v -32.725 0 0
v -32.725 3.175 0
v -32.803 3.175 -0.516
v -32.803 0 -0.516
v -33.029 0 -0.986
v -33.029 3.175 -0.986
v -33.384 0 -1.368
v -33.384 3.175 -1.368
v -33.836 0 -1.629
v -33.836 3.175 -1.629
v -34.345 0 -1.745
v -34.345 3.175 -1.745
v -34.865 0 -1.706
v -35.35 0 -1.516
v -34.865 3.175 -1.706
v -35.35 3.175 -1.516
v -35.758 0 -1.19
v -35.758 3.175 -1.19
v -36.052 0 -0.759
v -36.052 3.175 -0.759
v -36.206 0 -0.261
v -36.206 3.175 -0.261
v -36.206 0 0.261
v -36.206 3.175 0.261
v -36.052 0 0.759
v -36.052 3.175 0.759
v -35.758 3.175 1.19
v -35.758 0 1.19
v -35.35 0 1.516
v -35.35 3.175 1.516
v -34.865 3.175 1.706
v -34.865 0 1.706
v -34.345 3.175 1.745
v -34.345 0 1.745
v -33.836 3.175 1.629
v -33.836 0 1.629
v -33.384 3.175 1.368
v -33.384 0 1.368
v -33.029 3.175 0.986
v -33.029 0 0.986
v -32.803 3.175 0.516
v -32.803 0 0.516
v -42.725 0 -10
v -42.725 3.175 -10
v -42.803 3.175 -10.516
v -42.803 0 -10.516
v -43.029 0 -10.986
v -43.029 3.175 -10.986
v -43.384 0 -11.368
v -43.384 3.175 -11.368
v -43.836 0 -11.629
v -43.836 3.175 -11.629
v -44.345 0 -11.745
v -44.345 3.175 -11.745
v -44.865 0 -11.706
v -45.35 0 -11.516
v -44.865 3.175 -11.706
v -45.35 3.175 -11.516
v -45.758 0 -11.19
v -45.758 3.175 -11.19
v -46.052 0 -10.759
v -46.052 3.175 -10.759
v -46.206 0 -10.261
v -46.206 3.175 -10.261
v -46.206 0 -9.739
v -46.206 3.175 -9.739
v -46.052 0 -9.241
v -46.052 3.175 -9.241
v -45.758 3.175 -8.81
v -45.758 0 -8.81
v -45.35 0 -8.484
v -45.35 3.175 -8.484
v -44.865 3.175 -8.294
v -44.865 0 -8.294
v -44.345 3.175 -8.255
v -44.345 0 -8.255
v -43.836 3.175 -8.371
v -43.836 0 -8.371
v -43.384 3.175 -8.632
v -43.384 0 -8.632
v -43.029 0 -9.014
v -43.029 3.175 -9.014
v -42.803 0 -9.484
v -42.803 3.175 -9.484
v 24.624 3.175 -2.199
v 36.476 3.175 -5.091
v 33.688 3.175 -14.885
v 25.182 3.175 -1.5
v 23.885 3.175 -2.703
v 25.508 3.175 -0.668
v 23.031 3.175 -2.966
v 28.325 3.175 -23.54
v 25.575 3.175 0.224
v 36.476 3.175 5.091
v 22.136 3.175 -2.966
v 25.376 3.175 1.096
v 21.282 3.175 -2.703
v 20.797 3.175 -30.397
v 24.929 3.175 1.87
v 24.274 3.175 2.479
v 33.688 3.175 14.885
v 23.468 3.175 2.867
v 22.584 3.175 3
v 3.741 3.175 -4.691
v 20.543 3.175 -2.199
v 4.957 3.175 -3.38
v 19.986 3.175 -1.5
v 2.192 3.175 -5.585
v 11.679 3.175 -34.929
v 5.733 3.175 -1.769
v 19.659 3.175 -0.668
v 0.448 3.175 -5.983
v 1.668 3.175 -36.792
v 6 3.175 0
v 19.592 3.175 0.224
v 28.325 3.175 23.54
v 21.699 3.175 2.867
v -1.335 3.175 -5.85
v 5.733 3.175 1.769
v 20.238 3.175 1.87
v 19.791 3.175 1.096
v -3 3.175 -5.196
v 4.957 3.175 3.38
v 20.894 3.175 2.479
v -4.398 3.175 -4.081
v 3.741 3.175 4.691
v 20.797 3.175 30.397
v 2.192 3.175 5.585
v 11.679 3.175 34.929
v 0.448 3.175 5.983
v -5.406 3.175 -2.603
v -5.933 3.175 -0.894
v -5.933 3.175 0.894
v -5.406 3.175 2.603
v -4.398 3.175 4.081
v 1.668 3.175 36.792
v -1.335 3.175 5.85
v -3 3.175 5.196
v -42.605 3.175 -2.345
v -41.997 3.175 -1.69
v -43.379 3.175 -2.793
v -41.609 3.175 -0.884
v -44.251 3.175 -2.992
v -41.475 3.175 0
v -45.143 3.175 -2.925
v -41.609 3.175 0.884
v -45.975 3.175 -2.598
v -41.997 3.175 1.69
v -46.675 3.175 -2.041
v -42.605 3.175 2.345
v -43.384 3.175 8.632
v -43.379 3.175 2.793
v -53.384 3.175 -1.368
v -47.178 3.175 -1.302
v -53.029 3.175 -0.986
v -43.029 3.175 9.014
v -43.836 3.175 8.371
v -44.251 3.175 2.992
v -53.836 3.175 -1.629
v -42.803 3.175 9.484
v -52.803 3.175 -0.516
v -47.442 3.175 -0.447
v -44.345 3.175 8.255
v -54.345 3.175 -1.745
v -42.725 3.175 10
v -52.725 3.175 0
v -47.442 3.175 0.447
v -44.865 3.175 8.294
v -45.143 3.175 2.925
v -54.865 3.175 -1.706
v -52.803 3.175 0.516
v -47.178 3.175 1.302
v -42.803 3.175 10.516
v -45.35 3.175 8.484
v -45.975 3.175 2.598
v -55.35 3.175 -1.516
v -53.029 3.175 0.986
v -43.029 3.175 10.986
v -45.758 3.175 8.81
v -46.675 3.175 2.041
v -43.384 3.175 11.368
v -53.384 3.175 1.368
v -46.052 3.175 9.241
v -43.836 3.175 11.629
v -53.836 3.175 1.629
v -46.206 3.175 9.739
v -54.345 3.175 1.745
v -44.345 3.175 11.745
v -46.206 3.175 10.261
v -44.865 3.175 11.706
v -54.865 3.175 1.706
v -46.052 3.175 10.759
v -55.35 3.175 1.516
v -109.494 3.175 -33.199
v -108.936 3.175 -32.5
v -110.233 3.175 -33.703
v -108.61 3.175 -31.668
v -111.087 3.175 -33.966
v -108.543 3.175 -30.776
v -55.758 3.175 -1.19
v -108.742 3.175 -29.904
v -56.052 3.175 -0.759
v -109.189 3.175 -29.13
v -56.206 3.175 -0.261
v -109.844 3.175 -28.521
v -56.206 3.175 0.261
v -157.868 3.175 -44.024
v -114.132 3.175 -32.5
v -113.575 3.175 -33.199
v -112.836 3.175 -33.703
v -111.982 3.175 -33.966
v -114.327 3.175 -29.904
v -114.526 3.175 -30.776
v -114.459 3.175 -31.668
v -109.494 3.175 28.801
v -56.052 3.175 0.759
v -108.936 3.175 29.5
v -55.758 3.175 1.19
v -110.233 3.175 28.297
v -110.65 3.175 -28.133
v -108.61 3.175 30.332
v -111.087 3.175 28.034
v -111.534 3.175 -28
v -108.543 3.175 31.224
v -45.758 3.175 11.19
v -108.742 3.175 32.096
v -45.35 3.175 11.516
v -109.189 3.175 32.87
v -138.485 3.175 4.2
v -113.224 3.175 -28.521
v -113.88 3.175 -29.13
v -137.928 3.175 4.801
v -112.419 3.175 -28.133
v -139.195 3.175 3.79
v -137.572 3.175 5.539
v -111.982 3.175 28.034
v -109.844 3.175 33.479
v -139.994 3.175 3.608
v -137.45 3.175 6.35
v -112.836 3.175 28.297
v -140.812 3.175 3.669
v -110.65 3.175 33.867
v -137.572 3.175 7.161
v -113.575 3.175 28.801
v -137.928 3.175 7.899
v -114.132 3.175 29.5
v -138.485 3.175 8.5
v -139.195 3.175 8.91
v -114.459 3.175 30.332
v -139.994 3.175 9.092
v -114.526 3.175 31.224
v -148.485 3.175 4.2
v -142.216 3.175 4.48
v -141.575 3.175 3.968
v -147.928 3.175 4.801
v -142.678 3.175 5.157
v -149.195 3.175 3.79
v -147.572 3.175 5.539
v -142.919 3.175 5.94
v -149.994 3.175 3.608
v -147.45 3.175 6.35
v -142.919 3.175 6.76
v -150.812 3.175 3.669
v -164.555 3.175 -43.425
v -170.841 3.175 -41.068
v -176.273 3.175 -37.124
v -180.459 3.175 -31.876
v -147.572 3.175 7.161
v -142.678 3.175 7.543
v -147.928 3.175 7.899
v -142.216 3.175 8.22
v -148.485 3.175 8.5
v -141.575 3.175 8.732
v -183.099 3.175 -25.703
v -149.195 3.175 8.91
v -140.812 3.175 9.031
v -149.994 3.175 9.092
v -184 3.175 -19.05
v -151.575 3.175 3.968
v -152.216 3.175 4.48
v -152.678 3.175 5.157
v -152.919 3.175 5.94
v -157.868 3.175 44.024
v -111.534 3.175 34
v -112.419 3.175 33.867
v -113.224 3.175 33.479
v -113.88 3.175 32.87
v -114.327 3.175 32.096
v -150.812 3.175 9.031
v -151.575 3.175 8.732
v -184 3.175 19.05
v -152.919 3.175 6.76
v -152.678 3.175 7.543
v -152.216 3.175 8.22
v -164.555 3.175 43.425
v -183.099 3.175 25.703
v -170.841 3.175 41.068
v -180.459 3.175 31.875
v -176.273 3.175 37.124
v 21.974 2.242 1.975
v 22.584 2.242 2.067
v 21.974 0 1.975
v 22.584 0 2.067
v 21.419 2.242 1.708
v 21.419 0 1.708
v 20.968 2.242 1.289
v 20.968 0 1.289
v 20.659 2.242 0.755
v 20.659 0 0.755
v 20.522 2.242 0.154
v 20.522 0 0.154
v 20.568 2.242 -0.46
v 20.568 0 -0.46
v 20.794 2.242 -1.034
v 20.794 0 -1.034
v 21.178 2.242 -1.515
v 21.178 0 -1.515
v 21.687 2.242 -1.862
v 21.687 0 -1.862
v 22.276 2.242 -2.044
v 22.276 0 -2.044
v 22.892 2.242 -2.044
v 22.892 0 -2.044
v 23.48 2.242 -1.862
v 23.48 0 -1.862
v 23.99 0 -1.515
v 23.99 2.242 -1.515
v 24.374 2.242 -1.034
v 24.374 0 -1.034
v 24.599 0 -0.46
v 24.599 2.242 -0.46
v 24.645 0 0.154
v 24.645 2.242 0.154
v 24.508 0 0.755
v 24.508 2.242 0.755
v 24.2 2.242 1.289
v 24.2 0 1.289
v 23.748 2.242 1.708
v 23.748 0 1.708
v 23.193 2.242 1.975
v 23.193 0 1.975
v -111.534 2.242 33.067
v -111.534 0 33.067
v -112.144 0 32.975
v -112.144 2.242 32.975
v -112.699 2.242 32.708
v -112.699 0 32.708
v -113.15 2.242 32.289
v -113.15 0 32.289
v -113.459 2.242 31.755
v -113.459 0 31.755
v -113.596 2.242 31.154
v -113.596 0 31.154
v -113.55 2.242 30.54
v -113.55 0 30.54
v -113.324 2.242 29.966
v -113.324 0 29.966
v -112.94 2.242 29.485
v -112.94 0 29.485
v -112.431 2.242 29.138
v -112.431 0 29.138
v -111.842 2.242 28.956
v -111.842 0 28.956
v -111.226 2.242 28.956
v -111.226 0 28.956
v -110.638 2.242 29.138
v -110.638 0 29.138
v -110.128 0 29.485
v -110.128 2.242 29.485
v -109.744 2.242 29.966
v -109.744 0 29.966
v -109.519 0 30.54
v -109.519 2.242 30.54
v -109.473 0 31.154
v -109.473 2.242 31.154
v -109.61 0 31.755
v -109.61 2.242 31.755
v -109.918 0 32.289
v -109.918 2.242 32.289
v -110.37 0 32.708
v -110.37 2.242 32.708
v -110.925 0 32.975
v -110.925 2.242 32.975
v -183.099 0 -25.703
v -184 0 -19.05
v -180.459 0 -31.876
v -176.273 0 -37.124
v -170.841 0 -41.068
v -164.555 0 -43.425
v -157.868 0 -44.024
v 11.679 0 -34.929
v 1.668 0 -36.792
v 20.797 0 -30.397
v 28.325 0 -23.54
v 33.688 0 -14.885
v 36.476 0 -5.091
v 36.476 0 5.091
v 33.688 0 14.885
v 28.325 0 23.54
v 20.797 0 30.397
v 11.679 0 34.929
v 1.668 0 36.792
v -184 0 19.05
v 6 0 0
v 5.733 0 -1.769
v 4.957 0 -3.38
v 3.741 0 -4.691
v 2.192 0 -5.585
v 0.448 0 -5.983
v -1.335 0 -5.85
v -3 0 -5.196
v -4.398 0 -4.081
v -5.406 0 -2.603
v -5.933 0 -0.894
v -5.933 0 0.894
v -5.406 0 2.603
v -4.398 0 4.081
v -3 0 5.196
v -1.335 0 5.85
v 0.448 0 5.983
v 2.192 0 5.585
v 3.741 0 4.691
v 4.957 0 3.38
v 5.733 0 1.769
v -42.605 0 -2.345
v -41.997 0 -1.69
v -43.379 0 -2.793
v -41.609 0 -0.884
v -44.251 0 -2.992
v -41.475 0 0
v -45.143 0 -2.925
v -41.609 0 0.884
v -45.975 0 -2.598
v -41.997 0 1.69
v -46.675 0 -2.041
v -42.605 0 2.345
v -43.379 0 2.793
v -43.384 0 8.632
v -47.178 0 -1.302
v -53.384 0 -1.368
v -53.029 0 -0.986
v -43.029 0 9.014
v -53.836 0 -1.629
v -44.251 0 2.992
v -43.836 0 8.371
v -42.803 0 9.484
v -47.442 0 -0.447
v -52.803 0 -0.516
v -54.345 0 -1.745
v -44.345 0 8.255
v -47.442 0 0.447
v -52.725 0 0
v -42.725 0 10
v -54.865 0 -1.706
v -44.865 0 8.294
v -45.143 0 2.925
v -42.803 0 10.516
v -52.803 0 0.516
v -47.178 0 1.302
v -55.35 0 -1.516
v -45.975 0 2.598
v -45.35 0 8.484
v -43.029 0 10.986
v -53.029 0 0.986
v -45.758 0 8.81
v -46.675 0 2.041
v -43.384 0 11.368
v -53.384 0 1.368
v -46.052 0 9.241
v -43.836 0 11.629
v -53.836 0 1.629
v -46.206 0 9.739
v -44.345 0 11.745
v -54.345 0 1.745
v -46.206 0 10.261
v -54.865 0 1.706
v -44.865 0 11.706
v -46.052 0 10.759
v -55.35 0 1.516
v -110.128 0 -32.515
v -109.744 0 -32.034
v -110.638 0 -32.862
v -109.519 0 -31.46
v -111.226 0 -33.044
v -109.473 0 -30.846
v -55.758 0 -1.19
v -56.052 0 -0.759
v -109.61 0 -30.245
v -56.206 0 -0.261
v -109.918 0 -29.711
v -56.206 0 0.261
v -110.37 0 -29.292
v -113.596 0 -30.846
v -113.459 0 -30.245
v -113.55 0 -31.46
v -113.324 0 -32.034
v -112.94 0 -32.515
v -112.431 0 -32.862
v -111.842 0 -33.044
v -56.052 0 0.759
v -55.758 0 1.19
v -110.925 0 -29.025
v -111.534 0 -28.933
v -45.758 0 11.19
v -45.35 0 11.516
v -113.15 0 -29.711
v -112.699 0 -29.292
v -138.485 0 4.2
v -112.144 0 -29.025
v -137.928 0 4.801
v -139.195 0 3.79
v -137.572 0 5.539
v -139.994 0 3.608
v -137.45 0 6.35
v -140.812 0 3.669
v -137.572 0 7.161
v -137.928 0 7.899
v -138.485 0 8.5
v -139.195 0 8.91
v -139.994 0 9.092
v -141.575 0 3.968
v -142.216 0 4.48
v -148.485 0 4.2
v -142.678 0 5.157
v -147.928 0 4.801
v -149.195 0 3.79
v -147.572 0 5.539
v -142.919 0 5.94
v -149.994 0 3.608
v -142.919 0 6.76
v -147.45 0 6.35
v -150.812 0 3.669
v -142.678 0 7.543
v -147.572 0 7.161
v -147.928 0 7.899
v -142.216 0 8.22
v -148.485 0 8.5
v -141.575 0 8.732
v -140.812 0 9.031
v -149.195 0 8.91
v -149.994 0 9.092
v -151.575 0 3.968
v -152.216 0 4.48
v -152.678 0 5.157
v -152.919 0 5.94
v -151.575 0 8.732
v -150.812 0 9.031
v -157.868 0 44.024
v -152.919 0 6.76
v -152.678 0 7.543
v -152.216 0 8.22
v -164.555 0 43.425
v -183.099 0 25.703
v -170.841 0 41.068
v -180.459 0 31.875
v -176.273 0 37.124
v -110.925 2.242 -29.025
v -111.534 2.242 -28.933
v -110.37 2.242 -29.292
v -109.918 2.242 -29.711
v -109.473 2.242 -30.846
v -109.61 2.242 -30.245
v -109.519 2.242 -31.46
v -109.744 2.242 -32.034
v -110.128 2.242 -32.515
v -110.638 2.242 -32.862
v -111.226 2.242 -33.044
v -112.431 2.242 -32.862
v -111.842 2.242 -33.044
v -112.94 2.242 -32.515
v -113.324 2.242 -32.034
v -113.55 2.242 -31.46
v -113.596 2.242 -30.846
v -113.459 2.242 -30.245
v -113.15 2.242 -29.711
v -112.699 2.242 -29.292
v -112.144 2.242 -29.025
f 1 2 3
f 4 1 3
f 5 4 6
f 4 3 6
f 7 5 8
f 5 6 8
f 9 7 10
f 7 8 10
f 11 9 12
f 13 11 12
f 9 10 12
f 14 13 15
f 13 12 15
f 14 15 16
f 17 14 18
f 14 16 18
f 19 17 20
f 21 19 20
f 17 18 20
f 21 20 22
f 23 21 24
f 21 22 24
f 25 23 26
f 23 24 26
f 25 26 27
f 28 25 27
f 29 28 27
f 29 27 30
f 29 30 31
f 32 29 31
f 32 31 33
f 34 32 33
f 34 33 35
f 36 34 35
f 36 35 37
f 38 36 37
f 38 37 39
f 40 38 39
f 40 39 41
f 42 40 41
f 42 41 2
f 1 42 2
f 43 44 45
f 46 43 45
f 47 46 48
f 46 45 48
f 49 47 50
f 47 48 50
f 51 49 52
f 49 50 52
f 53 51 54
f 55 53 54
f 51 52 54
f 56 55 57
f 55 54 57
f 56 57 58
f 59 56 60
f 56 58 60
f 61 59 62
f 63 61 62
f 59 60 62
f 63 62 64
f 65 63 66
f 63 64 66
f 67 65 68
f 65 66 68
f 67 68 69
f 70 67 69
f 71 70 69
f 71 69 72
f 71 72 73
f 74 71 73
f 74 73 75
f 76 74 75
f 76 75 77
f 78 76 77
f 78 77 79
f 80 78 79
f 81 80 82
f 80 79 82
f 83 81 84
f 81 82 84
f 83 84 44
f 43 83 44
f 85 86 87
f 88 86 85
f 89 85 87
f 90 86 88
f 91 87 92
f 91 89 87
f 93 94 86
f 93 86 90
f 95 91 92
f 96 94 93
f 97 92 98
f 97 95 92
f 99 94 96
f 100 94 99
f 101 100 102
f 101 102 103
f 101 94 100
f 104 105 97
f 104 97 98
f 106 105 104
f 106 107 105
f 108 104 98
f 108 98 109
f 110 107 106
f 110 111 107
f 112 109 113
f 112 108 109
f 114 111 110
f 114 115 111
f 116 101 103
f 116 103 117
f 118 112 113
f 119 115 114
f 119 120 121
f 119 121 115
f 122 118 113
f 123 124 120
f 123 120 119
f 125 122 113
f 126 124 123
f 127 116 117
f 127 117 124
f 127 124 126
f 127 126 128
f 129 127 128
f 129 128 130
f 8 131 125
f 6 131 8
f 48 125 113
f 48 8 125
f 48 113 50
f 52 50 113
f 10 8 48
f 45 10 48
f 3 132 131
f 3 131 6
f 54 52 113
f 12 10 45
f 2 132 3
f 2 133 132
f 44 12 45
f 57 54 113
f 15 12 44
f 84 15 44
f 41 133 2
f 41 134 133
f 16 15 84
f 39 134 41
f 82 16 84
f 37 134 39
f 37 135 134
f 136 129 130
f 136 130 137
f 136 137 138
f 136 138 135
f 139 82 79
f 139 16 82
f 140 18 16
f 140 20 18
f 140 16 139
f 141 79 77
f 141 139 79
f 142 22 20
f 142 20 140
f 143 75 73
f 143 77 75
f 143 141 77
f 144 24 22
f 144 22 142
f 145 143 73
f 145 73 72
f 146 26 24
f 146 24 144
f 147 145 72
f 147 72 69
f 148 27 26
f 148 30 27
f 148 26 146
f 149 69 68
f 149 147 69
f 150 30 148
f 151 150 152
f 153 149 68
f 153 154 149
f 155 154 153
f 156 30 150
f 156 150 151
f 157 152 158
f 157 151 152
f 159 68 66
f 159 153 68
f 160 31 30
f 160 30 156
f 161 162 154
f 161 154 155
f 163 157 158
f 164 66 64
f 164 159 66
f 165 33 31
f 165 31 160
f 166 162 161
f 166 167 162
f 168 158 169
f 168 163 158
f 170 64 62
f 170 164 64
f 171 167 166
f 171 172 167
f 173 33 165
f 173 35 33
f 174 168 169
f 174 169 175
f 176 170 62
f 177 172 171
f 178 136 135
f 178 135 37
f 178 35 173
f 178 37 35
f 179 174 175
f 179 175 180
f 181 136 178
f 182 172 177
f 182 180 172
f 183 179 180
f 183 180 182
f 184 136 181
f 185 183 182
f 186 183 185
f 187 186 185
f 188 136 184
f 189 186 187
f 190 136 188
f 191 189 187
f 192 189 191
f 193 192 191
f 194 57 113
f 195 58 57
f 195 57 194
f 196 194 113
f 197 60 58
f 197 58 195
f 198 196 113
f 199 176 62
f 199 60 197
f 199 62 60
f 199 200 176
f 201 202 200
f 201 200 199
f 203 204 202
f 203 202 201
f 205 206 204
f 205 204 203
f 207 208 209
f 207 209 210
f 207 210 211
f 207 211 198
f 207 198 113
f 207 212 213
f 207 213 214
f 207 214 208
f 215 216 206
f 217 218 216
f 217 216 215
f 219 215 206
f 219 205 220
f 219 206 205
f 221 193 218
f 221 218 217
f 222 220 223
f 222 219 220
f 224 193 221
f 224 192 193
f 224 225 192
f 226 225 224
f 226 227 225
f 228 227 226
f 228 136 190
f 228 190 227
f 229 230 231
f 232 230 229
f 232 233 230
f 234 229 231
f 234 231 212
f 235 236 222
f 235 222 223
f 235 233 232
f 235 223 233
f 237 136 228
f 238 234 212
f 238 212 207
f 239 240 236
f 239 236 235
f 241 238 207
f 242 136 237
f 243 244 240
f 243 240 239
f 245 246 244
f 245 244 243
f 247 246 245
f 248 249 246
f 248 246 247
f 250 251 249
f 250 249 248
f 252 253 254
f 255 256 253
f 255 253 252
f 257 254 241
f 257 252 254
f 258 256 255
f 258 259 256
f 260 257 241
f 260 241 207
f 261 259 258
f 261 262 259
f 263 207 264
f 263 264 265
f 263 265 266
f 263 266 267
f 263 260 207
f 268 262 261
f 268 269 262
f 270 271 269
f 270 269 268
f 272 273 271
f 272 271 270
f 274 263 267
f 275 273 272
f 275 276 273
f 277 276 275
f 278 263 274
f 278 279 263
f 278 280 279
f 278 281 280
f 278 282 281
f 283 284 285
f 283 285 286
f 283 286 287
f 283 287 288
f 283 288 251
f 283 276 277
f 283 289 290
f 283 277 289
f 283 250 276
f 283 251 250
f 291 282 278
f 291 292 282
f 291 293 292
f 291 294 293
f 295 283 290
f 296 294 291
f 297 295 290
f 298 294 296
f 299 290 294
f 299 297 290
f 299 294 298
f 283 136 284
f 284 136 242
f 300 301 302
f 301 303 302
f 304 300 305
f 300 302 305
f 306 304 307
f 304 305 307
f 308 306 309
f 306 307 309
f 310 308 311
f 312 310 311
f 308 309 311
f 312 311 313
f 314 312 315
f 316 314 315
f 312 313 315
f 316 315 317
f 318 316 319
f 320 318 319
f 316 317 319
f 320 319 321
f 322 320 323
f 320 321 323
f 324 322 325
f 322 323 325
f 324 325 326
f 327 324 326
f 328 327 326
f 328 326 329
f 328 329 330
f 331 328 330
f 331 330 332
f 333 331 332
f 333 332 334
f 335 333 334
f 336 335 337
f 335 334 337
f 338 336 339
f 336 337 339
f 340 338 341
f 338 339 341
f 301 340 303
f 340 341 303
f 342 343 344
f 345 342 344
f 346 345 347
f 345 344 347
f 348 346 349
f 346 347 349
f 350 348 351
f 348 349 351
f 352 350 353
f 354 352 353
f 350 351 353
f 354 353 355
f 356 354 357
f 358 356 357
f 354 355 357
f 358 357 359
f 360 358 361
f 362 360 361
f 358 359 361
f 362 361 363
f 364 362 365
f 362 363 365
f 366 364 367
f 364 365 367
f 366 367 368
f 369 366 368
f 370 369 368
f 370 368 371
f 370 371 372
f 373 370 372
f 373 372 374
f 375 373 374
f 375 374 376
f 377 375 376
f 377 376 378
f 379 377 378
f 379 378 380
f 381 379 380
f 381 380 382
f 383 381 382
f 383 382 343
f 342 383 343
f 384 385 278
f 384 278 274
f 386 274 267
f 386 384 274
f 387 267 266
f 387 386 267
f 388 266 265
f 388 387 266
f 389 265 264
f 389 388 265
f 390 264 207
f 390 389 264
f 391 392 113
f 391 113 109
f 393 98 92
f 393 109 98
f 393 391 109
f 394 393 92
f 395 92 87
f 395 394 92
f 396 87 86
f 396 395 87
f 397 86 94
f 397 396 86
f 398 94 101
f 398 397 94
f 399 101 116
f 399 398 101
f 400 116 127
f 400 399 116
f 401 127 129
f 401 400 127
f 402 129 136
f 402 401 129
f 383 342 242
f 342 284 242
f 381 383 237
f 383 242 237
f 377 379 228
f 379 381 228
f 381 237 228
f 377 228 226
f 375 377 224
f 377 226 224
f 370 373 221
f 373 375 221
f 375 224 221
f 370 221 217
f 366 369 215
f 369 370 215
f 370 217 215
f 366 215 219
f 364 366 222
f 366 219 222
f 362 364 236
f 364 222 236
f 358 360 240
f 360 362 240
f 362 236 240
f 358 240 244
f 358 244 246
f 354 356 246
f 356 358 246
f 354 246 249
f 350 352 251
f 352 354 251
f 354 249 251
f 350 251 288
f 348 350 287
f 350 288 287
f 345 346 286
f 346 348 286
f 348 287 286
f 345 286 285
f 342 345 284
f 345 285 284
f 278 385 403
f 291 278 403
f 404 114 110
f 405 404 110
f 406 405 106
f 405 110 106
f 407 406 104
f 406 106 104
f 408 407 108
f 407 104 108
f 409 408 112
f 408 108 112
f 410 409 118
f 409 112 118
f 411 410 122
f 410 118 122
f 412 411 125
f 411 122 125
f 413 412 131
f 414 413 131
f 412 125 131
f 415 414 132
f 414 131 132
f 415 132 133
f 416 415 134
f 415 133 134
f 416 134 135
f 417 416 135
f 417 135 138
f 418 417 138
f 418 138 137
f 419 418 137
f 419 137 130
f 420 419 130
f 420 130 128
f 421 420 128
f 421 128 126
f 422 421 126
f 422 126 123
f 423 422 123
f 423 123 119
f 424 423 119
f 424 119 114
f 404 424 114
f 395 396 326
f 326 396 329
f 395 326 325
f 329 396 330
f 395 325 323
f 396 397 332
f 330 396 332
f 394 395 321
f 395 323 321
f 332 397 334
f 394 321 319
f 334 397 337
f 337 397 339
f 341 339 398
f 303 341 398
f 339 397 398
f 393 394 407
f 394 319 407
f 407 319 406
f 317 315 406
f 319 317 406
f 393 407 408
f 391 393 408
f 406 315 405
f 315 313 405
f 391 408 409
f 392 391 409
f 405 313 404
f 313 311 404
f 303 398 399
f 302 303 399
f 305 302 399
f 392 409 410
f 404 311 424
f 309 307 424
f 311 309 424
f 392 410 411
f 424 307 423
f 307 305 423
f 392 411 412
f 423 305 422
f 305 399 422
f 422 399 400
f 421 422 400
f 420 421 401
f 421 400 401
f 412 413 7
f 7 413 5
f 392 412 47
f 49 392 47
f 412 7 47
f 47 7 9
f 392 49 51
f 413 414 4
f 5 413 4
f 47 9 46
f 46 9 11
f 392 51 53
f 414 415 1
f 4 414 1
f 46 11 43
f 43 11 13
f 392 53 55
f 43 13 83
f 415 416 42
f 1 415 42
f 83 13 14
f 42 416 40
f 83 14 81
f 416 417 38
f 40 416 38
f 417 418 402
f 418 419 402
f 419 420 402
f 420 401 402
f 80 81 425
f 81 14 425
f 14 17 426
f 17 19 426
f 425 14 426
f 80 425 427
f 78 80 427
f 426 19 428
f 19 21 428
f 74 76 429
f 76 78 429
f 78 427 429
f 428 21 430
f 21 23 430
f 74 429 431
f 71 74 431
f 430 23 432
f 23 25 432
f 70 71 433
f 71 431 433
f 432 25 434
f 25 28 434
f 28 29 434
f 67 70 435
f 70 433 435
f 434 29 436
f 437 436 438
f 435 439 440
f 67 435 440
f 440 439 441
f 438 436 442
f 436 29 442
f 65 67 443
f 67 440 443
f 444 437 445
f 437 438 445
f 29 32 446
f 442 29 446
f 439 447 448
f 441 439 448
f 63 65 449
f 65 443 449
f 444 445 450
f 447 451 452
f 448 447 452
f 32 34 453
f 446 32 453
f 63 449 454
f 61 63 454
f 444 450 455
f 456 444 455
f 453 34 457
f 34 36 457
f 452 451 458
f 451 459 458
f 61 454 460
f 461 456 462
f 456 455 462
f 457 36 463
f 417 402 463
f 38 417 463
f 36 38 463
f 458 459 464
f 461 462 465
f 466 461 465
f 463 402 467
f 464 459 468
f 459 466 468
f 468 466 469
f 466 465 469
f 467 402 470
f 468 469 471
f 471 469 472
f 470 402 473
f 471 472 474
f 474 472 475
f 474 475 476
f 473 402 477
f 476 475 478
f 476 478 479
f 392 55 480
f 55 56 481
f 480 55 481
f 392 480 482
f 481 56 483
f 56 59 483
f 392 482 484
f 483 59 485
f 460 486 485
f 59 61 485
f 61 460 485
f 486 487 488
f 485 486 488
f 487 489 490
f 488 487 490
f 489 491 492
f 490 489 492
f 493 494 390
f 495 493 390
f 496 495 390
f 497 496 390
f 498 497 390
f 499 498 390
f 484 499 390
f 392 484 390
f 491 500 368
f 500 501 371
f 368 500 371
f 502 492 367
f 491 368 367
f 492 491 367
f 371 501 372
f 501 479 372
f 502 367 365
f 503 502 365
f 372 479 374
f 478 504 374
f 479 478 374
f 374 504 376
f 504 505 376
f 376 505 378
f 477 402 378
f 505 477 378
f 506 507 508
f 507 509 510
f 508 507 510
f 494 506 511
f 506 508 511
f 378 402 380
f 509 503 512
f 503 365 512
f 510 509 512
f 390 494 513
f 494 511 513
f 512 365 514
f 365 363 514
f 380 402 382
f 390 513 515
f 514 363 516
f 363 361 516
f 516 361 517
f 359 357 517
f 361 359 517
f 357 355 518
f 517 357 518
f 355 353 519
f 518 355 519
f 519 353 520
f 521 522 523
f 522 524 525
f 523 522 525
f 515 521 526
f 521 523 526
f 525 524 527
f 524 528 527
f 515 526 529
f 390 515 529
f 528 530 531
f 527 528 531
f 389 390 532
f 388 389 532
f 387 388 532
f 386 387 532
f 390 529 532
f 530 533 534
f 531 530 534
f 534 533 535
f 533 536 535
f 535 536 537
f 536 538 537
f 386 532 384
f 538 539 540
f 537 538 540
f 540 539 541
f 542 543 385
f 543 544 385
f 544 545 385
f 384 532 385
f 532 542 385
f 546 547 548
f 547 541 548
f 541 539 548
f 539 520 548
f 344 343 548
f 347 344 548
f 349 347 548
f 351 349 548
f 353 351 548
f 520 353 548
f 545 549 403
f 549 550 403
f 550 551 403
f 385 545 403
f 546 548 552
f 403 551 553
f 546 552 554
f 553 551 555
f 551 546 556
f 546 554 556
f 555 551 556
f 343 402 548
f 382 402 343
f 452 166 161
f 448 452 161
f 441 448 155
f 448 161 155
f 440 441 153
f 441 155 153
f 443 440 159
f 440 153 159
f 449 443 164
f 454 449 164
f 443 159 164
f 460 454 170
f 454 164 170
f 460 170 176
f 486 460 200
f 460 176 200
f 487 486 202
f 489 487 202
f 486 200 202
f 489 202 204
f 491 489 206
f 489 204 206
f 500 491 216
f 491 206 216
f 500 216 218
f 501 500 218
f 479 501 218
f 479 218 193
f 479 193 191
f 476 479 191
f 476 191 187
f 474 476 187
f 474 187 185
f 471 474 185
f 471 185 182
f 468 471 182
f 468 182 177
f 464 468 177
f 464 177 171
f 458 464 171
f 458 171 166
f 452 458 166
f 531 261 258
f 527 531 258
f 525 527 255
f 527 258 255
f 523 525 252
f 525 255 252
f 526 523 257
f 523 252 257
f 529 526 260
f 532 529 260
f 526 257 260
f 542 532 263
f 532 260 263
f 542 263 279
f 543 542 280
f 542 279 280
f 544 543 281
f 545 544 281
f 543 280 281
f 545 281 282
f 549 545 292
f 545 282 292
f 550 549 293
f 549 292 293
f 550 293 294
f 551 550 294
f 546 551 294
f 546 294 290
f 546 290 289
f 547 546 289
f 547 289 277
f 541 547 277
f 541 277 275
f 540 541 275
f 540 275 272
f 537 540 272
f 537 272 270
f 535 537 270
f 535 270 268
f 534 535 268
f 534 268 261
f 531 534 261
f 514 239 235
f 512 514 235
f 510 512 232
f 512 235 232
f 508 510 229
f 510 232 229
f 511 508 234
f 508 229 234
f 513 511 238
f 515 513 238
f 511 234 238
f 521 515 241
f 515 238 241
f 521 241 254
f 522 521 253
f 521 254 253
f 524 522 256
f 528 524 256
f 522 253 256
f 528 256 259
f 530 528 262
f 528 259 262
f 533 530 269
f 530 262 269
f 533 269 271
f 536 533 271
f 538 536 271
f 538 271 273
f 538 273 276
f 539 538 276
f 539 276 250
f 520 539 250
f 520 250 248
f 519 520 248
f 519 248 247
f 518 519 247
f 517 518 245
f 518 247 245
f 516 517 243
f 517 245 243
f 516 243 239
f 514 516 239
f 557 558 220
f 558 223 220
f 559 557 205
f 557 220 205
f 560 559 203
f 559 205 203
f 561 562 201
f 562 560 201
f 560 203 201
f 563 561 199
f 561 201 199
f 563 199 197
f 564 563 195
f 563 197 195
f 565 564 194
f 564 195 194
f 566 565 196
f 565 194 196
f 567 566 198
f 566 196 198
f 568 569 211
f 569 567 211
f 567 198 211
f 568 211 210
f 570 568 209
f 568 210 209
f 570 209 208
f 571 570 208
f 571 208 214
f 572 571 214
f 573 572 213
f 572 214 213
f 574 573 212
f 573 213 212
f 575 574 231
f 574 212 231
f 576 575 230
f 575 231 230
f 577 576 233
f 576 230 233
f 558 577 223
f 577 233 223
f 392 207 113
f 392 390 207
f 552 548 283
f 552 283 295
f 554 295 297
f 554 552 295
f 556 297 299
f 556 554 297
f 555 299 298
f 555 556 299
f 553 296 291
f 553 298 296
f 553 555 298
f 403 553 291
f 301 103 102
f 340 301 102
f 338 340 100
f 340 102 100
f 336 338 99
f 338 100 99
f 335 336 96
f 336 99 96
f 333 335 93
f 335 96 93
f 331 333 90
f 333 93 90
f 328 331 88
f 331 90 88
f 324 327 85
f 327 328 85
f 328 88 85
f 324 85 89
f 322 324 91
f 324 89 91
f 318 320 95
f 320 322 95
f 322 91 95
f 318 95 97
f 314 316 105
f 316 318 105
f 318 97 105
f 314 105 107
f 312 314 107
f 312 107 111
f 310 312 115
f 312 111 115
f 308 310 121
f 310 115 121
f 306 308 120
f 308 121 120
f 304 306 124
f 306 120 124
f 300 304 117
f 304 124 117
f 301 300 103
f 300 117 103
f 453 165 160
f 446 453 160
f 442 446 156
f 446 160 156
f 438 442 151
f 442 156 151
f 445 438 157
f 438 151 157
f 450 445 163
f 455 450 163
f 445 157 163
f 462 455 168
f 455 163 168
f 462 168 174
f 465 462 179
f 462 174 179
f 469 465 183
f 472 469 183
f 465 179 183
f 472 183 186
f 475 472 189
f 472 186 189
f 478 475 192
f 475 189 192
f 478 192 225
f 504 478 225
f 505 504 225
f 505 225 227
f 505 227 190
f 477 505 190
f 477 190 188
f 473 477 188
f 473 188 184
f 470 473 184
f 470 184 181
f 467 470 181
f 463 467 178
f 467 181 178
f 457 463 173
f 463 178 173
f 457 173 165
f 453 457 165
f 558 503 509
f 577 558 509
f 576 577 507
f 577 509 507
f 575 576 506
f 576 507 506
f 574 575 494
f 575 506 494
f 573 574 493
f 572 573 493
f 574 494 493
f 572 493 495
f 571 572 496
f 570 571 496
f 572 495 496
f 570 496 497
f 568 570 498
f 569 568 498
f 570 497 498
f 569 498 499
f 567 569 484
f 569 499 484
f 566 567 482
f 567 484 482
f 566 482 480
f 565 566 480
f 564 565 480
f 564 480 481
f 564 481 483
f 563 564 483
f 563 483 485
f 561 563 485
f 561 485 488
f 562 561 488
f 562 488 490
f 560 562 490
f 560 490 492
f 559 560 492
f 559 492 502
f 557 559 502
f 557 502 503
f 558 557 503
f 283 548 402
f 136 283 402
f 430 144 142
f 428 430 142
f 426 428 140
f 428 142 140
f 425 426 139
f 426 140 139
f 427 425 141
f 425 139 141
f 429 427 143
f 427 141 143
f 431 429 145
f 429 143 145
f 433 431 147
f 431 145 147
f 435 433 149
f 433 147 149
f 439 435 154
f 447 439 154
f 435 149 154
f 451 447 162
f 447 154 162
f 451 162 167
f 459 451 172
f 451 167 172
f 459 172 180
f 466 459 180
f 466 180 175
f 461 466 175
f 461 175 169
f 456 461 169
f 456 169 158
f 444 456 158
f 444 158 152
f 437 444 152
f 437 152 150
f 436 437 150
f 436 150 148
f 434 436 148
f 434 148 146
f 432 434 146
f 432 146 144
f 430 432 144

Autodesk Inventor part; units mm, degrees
ref_plane "YZ Plane" through (0, 0, 0) normal (1, 0, 0) x (0, 1, 0)
ref_plane "XZ Plane" through (0, 0, 0) normal (0, 1, 0) x (-1, 0, 0)
ref_plane "XY Plane" through (0, 0, 0) normal (0, 0, 1) x (1, 0, 0)
sketch "Sketch1" plane through (0, 0, 0) normal (0, 1, 0) x (-1, 0, 0)
  arc A0 (-1.6679, 36.7922) -> (-1.6679, -36.7922) centre (0, 0) ccw
  arc A1 (157.8679, -44.0244) -> (184, -19.05) centre (159, -19.05) ccw
  arc A2 (184, 19.05) -> (157.8679, 44.0244) centre (159, 19.05) ccw
  line L0 (157.8679, -44.0244) -> (-1.6679, -36.7922)
  line L1 (157.8679, 44.0244) -> (-1.6679, 36.7922)
  line L2 (184, -19.05) -> (184, 19.05)
  line L3 (0, 0) -> (1115.1702, 0)
  dimension "d0" = 50
  dimension "d1" = 159
  dimension "d2" = 38.1
  dimension "d3" = 36.83
extrude "Main" add sketch "Sketch1" along normal blind 3.175
sketch "Sketch2" plane through (0, 3.175, 0) normal (0, 1, 0) x (1, 0, 0)
  circle A0 centre (0, 0) radius 6
  circle A1 centre (-44.4754, 0) radius 3
  arc A2 (-184, -19.05) -> (-157.8679, -44.0244) centre (-159, -19.05) ccw projected
  arc A3 (-157.8679, 44.0244) -> (-184, 19.05) centre (-159, 19.05) ccw projected
  line L0 (0, 0) -> (-245.2379, 0)
  dimension "d6" = 6
  dimension "d40" = 12
  dimension "d41" = 44.4754
extrude "Axis Holes" cut sketch "Sketch2" against normal through all
sketch "Sketch5" plane through (0, 3.175, 0) normal (0, 1, 0) x (1, 0, 0)
  line L0 (-133.2, -6.35) -> (-133.2, 29.1375) construction
  line L1 (-184, 19.05) -> (-184, -19.05) construction
  circle A0 centre (-140.2, -6.35) radius 2.75
  circle A1 centre (-150.2, -6.35) radius 2.75
  point P0 (0, 0)
  dimension "d43" = 50.8
  dimension "d44" = 7
  dimension "d45" = 10
  dimension "d46" = 5.5
extrude "Extrusion6" cut sketch "Sketch5" against normal through all
sketch "Sketch7" plane through (0, 3.175, 0) normal (0, 1, 0) x (1, 0, 0)
  circle A0 centre (-44.4754, 0) radius 3 construction
  circle A1 centre (-44.4754, 0) radius 10 construction
  circle A2 centre (-44.4754, 10) radius 1.75
  circle A3 centre (-54.4754, 0) radius 1.75
  circle A4 centre (-44.4754, -10) radius 1.75
  circle A5 centre (-34.4754, 0) radius 1.75
  point P0 (0, 0)
  dimension "d63" = 20
  dimension "d58" = 3.5
  dimension "d61" = 360
extrude "Extrusion8" cut sketch "Sketch7" against normal blind 10
sketch "Sketch9" plane through (0, 3.175, 0) normal (0, 1, 0) x (1, 0, 0)
  circle A0 centre (-44.4754, 0) radius 3 projected
  point P0 (0, 0)
  point P1 (-12.3688, -17.5481)
  point P2 (-111.5344, -31)
  point P3 (-111.5344, 31)
  point P4 (22.5836, 0)
  dimension "d73" = 67.059
  dimension "d74" = 67.059
  dimension "d75" = 31
  dimension "d76" = 31
hole "Hole1" at (-111.5344, 3.175, 31) at (-111.5344, 3.175, -31) at (22.5836, 3.175, 0) direction (0, -1, 0) diameter 4.134 end through all countersink diameter 6 countersink angle 90 thread size "M5x0.8" class "6H" standard "ISO Metric profile"
properties part number "Wrist Side Brase" material "Aluminum 6061"
